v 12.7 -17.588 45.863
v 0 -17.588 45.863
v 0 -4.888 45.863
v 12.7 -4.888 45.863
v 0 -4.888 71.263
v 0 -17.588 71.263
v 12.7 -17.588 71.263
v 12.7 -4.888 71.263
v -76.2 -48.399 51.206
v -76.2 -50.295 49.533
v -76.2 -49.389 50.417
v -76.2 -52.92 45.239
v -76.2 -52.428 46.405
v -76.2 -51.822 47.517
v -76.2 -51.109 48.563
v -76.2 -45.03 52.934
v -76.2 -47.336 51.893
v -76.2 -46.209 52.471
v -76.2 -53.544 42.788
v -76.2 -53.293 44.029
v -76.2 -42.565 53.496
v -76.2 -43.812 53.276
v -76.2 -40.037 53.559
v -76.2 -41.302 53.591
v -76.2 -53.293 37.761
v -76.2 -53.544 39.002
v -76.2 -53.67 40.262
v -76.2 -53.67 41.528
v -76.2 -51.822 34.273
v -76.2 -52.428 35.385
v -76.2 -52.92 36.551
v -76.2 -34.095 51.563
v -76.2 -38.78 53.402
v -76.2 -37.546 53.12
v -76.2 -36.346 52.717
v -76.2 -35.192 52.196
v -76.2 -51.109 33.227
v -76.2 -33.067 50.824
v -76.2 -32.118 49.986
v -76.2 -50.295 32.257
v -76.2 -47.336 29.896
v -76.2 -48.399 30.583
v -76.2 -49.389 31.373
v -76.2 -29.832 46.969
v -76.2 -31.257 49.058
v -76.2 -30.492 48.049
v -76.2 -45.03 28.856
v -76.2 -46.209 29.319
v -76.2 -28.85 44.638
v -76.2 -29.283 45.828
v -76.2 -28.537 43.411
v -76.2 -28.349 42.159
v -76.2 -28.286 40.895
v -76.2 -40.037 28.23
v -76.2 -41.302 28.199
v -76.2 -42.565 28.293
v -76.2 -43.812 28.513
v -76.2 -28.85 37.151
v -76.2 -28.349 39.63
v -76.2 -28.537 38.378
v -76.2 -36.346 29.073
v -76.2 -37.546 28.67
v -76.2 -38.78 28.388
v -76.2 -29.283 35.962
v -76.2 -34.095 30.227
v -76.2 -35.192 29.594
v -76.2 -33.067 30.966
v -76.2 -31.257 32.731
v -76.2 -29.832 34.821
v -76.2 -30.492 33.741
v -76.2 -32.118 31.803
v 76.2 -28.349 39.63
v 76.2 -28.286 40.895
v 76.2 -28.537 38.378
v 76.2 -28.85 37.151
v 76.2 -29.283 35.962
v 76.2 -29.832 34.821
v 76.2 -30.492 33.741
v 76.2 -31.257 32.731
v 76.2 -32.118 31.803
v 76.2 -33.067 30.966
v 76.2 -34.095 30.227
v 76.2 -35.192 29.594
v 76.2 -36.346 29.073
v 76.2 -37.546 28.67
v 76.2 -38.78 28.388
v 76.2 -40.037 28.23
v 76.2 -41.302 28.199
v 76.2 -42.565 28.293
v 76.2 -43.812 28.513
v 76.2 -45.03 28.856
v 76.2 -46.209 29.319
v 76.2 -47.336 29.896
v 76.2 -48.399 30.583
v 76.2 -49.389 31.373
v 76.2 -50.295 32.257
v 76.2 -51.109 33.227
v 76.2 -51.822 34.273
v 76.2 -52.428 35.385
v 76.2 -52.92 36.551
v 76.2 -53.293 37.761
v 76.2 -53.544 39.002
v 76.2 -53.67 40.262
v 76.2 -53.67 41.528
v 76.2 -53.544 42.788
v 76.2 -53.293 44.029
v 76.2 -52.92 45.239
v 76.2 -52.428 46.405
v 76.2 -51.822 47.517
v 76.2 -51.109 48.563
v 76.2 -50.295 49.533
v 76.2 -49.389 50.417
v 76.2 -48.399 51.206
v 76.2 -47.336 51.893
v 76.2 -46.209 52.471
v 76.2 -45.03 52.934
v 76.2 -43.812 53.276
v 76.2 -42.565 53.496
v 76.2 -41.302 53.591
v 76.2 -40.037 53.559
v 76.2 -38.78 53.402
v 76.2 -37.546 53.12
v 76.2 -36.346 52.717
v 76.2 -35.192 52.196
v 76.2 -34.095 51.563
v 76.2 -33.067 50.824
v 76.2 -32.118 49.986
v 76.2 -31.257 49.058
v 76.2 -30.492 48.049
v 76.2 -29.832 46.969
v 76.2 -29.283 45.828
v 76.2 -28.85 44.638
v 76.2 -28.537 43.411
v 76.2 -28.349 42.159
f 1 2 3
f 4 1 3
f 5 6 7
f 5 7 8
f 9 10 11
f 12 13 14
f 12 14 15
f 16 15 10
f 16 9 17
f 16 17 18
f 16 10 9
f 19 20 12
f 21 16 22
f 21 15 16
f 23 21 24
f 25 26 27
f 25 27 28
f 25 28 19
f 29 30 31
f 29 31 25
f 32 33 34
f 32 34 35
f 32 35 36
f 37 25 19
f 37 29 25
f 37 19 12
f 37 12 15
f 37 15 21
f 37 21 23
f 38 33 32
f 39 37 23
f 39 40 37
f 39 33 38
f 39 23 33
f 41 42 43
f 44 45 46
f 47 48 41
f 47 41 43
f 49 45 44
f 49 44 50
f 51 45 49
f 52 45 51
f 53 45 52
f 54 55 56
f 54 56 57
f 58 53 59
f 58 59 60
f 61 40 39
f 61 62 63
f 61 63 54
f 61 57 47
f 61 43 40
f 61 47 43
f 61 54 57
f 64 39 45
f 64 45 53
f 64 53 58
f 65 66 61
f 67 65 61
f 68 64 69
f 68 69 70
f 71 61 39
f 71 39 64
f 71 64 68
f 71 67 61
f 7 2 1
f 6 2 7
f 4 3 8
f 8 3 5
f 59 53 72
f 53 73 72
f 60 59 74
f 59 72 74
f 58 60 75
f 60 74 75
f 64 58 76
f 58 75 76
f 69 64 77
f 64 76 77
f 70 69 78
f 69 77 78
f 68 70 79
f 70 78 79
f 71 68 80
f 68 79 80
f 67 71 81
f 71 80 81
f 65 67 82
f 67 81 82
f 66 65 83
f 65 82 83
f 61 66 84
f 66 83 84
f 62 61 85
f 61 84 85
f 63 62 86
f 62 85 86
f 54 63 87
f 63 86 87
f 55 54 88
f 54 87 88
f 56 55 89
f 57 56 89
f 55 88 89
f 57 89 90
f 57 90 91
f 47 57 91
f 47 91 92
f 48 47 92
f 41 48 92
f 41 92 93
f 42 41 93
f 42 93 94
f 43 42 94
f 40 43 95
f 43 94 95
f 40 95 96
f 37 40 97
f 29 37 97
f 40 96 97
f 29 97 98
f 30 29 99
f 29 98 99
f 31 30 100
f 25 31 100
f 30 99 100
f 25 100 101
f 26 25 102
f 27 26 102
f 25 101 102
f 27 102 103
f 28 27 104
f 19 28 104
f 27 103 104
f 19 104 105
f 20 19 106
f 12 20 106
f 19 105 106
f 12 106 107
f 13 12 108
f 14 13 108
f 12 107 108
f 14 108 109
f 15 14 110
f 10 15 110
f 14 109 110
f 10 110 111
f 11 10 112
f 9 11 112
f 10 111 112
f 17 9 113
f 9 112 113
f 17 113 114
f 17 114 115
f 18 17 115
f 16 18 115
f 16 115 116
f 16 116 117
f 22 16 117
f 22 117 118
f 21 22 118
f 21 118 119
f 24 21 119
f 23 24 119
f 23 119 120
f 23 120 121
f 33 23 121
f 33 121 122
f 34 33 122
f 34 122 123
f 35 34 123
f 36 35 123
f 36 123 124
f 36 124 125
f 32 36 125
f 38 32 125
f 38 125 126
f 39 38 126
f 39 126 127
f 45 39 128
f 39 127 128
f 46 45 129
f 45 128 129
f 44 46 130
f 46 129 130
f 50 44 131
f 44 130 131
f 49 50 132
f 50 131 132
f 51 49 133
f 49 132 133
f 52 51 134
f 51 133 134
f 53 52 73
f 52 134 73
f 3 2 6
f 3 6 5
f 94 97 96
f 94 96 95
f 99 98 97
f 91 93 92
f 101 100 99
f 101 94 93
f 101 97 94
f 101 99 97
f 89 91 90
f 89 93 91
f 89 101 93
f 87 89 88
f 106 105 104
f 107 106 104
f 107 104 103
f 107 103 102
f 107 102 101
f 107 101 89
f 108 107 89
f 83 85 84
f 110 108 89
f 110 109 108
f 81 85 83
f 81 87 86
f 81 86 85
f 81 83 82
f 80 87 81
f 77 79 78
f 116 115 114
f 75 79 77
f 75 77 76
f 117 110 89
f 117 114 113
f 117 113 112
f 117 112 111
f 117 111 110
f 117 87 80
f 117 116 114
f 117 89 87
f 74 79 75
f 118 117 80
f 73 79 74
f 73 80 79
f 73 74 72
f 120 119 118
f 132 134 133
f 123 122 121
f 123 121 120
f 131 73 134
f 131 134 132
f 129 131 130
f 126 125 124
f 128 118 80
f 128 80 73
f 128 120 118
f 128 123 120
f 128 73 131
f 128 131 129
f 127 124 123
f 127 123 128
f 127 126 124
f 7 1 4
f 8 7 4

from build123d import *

# Parameters (mm, degrees)
F0_R      = 12.7
F1_DEPTH  = 76.2
F1_FACE_R = 12.7
F2_DEPTH  = 76.2
F3_W      = 12.7
F3_H      = 25.4
F4_DEPTH  = 12.7


with BuildPart() as f1:
    # F0 (on Right) → F1 (new body)
    with BuildSketch(Plane.YZ):
        with Locations((-40.985581, 40.894877)):
            Circle(F0_R)
    extrude(amount=F1_DEPTH)

    # F1_face (on face) → F2 (join)
    with BuildSketch(Plane(origin=(0, -40.985581, 40.894877), x_dir=(0, 1, 0), z_dir=(-1, 0, 0))):
        Circle(F1_FACE_R)
    extrude(amount=F2_DEPTH)


with BuildPart() as f4:
    # F3 (on Right) → F4 (new body)
    with BuildSketch(Plane.YZ):
        with Locations((-11.238228, 58.56257)):
            Rectangle(F3_W, F3_H)
    extrude(amount=F4_DEPTH)


solid = Compound([f1.part, f4.part])
